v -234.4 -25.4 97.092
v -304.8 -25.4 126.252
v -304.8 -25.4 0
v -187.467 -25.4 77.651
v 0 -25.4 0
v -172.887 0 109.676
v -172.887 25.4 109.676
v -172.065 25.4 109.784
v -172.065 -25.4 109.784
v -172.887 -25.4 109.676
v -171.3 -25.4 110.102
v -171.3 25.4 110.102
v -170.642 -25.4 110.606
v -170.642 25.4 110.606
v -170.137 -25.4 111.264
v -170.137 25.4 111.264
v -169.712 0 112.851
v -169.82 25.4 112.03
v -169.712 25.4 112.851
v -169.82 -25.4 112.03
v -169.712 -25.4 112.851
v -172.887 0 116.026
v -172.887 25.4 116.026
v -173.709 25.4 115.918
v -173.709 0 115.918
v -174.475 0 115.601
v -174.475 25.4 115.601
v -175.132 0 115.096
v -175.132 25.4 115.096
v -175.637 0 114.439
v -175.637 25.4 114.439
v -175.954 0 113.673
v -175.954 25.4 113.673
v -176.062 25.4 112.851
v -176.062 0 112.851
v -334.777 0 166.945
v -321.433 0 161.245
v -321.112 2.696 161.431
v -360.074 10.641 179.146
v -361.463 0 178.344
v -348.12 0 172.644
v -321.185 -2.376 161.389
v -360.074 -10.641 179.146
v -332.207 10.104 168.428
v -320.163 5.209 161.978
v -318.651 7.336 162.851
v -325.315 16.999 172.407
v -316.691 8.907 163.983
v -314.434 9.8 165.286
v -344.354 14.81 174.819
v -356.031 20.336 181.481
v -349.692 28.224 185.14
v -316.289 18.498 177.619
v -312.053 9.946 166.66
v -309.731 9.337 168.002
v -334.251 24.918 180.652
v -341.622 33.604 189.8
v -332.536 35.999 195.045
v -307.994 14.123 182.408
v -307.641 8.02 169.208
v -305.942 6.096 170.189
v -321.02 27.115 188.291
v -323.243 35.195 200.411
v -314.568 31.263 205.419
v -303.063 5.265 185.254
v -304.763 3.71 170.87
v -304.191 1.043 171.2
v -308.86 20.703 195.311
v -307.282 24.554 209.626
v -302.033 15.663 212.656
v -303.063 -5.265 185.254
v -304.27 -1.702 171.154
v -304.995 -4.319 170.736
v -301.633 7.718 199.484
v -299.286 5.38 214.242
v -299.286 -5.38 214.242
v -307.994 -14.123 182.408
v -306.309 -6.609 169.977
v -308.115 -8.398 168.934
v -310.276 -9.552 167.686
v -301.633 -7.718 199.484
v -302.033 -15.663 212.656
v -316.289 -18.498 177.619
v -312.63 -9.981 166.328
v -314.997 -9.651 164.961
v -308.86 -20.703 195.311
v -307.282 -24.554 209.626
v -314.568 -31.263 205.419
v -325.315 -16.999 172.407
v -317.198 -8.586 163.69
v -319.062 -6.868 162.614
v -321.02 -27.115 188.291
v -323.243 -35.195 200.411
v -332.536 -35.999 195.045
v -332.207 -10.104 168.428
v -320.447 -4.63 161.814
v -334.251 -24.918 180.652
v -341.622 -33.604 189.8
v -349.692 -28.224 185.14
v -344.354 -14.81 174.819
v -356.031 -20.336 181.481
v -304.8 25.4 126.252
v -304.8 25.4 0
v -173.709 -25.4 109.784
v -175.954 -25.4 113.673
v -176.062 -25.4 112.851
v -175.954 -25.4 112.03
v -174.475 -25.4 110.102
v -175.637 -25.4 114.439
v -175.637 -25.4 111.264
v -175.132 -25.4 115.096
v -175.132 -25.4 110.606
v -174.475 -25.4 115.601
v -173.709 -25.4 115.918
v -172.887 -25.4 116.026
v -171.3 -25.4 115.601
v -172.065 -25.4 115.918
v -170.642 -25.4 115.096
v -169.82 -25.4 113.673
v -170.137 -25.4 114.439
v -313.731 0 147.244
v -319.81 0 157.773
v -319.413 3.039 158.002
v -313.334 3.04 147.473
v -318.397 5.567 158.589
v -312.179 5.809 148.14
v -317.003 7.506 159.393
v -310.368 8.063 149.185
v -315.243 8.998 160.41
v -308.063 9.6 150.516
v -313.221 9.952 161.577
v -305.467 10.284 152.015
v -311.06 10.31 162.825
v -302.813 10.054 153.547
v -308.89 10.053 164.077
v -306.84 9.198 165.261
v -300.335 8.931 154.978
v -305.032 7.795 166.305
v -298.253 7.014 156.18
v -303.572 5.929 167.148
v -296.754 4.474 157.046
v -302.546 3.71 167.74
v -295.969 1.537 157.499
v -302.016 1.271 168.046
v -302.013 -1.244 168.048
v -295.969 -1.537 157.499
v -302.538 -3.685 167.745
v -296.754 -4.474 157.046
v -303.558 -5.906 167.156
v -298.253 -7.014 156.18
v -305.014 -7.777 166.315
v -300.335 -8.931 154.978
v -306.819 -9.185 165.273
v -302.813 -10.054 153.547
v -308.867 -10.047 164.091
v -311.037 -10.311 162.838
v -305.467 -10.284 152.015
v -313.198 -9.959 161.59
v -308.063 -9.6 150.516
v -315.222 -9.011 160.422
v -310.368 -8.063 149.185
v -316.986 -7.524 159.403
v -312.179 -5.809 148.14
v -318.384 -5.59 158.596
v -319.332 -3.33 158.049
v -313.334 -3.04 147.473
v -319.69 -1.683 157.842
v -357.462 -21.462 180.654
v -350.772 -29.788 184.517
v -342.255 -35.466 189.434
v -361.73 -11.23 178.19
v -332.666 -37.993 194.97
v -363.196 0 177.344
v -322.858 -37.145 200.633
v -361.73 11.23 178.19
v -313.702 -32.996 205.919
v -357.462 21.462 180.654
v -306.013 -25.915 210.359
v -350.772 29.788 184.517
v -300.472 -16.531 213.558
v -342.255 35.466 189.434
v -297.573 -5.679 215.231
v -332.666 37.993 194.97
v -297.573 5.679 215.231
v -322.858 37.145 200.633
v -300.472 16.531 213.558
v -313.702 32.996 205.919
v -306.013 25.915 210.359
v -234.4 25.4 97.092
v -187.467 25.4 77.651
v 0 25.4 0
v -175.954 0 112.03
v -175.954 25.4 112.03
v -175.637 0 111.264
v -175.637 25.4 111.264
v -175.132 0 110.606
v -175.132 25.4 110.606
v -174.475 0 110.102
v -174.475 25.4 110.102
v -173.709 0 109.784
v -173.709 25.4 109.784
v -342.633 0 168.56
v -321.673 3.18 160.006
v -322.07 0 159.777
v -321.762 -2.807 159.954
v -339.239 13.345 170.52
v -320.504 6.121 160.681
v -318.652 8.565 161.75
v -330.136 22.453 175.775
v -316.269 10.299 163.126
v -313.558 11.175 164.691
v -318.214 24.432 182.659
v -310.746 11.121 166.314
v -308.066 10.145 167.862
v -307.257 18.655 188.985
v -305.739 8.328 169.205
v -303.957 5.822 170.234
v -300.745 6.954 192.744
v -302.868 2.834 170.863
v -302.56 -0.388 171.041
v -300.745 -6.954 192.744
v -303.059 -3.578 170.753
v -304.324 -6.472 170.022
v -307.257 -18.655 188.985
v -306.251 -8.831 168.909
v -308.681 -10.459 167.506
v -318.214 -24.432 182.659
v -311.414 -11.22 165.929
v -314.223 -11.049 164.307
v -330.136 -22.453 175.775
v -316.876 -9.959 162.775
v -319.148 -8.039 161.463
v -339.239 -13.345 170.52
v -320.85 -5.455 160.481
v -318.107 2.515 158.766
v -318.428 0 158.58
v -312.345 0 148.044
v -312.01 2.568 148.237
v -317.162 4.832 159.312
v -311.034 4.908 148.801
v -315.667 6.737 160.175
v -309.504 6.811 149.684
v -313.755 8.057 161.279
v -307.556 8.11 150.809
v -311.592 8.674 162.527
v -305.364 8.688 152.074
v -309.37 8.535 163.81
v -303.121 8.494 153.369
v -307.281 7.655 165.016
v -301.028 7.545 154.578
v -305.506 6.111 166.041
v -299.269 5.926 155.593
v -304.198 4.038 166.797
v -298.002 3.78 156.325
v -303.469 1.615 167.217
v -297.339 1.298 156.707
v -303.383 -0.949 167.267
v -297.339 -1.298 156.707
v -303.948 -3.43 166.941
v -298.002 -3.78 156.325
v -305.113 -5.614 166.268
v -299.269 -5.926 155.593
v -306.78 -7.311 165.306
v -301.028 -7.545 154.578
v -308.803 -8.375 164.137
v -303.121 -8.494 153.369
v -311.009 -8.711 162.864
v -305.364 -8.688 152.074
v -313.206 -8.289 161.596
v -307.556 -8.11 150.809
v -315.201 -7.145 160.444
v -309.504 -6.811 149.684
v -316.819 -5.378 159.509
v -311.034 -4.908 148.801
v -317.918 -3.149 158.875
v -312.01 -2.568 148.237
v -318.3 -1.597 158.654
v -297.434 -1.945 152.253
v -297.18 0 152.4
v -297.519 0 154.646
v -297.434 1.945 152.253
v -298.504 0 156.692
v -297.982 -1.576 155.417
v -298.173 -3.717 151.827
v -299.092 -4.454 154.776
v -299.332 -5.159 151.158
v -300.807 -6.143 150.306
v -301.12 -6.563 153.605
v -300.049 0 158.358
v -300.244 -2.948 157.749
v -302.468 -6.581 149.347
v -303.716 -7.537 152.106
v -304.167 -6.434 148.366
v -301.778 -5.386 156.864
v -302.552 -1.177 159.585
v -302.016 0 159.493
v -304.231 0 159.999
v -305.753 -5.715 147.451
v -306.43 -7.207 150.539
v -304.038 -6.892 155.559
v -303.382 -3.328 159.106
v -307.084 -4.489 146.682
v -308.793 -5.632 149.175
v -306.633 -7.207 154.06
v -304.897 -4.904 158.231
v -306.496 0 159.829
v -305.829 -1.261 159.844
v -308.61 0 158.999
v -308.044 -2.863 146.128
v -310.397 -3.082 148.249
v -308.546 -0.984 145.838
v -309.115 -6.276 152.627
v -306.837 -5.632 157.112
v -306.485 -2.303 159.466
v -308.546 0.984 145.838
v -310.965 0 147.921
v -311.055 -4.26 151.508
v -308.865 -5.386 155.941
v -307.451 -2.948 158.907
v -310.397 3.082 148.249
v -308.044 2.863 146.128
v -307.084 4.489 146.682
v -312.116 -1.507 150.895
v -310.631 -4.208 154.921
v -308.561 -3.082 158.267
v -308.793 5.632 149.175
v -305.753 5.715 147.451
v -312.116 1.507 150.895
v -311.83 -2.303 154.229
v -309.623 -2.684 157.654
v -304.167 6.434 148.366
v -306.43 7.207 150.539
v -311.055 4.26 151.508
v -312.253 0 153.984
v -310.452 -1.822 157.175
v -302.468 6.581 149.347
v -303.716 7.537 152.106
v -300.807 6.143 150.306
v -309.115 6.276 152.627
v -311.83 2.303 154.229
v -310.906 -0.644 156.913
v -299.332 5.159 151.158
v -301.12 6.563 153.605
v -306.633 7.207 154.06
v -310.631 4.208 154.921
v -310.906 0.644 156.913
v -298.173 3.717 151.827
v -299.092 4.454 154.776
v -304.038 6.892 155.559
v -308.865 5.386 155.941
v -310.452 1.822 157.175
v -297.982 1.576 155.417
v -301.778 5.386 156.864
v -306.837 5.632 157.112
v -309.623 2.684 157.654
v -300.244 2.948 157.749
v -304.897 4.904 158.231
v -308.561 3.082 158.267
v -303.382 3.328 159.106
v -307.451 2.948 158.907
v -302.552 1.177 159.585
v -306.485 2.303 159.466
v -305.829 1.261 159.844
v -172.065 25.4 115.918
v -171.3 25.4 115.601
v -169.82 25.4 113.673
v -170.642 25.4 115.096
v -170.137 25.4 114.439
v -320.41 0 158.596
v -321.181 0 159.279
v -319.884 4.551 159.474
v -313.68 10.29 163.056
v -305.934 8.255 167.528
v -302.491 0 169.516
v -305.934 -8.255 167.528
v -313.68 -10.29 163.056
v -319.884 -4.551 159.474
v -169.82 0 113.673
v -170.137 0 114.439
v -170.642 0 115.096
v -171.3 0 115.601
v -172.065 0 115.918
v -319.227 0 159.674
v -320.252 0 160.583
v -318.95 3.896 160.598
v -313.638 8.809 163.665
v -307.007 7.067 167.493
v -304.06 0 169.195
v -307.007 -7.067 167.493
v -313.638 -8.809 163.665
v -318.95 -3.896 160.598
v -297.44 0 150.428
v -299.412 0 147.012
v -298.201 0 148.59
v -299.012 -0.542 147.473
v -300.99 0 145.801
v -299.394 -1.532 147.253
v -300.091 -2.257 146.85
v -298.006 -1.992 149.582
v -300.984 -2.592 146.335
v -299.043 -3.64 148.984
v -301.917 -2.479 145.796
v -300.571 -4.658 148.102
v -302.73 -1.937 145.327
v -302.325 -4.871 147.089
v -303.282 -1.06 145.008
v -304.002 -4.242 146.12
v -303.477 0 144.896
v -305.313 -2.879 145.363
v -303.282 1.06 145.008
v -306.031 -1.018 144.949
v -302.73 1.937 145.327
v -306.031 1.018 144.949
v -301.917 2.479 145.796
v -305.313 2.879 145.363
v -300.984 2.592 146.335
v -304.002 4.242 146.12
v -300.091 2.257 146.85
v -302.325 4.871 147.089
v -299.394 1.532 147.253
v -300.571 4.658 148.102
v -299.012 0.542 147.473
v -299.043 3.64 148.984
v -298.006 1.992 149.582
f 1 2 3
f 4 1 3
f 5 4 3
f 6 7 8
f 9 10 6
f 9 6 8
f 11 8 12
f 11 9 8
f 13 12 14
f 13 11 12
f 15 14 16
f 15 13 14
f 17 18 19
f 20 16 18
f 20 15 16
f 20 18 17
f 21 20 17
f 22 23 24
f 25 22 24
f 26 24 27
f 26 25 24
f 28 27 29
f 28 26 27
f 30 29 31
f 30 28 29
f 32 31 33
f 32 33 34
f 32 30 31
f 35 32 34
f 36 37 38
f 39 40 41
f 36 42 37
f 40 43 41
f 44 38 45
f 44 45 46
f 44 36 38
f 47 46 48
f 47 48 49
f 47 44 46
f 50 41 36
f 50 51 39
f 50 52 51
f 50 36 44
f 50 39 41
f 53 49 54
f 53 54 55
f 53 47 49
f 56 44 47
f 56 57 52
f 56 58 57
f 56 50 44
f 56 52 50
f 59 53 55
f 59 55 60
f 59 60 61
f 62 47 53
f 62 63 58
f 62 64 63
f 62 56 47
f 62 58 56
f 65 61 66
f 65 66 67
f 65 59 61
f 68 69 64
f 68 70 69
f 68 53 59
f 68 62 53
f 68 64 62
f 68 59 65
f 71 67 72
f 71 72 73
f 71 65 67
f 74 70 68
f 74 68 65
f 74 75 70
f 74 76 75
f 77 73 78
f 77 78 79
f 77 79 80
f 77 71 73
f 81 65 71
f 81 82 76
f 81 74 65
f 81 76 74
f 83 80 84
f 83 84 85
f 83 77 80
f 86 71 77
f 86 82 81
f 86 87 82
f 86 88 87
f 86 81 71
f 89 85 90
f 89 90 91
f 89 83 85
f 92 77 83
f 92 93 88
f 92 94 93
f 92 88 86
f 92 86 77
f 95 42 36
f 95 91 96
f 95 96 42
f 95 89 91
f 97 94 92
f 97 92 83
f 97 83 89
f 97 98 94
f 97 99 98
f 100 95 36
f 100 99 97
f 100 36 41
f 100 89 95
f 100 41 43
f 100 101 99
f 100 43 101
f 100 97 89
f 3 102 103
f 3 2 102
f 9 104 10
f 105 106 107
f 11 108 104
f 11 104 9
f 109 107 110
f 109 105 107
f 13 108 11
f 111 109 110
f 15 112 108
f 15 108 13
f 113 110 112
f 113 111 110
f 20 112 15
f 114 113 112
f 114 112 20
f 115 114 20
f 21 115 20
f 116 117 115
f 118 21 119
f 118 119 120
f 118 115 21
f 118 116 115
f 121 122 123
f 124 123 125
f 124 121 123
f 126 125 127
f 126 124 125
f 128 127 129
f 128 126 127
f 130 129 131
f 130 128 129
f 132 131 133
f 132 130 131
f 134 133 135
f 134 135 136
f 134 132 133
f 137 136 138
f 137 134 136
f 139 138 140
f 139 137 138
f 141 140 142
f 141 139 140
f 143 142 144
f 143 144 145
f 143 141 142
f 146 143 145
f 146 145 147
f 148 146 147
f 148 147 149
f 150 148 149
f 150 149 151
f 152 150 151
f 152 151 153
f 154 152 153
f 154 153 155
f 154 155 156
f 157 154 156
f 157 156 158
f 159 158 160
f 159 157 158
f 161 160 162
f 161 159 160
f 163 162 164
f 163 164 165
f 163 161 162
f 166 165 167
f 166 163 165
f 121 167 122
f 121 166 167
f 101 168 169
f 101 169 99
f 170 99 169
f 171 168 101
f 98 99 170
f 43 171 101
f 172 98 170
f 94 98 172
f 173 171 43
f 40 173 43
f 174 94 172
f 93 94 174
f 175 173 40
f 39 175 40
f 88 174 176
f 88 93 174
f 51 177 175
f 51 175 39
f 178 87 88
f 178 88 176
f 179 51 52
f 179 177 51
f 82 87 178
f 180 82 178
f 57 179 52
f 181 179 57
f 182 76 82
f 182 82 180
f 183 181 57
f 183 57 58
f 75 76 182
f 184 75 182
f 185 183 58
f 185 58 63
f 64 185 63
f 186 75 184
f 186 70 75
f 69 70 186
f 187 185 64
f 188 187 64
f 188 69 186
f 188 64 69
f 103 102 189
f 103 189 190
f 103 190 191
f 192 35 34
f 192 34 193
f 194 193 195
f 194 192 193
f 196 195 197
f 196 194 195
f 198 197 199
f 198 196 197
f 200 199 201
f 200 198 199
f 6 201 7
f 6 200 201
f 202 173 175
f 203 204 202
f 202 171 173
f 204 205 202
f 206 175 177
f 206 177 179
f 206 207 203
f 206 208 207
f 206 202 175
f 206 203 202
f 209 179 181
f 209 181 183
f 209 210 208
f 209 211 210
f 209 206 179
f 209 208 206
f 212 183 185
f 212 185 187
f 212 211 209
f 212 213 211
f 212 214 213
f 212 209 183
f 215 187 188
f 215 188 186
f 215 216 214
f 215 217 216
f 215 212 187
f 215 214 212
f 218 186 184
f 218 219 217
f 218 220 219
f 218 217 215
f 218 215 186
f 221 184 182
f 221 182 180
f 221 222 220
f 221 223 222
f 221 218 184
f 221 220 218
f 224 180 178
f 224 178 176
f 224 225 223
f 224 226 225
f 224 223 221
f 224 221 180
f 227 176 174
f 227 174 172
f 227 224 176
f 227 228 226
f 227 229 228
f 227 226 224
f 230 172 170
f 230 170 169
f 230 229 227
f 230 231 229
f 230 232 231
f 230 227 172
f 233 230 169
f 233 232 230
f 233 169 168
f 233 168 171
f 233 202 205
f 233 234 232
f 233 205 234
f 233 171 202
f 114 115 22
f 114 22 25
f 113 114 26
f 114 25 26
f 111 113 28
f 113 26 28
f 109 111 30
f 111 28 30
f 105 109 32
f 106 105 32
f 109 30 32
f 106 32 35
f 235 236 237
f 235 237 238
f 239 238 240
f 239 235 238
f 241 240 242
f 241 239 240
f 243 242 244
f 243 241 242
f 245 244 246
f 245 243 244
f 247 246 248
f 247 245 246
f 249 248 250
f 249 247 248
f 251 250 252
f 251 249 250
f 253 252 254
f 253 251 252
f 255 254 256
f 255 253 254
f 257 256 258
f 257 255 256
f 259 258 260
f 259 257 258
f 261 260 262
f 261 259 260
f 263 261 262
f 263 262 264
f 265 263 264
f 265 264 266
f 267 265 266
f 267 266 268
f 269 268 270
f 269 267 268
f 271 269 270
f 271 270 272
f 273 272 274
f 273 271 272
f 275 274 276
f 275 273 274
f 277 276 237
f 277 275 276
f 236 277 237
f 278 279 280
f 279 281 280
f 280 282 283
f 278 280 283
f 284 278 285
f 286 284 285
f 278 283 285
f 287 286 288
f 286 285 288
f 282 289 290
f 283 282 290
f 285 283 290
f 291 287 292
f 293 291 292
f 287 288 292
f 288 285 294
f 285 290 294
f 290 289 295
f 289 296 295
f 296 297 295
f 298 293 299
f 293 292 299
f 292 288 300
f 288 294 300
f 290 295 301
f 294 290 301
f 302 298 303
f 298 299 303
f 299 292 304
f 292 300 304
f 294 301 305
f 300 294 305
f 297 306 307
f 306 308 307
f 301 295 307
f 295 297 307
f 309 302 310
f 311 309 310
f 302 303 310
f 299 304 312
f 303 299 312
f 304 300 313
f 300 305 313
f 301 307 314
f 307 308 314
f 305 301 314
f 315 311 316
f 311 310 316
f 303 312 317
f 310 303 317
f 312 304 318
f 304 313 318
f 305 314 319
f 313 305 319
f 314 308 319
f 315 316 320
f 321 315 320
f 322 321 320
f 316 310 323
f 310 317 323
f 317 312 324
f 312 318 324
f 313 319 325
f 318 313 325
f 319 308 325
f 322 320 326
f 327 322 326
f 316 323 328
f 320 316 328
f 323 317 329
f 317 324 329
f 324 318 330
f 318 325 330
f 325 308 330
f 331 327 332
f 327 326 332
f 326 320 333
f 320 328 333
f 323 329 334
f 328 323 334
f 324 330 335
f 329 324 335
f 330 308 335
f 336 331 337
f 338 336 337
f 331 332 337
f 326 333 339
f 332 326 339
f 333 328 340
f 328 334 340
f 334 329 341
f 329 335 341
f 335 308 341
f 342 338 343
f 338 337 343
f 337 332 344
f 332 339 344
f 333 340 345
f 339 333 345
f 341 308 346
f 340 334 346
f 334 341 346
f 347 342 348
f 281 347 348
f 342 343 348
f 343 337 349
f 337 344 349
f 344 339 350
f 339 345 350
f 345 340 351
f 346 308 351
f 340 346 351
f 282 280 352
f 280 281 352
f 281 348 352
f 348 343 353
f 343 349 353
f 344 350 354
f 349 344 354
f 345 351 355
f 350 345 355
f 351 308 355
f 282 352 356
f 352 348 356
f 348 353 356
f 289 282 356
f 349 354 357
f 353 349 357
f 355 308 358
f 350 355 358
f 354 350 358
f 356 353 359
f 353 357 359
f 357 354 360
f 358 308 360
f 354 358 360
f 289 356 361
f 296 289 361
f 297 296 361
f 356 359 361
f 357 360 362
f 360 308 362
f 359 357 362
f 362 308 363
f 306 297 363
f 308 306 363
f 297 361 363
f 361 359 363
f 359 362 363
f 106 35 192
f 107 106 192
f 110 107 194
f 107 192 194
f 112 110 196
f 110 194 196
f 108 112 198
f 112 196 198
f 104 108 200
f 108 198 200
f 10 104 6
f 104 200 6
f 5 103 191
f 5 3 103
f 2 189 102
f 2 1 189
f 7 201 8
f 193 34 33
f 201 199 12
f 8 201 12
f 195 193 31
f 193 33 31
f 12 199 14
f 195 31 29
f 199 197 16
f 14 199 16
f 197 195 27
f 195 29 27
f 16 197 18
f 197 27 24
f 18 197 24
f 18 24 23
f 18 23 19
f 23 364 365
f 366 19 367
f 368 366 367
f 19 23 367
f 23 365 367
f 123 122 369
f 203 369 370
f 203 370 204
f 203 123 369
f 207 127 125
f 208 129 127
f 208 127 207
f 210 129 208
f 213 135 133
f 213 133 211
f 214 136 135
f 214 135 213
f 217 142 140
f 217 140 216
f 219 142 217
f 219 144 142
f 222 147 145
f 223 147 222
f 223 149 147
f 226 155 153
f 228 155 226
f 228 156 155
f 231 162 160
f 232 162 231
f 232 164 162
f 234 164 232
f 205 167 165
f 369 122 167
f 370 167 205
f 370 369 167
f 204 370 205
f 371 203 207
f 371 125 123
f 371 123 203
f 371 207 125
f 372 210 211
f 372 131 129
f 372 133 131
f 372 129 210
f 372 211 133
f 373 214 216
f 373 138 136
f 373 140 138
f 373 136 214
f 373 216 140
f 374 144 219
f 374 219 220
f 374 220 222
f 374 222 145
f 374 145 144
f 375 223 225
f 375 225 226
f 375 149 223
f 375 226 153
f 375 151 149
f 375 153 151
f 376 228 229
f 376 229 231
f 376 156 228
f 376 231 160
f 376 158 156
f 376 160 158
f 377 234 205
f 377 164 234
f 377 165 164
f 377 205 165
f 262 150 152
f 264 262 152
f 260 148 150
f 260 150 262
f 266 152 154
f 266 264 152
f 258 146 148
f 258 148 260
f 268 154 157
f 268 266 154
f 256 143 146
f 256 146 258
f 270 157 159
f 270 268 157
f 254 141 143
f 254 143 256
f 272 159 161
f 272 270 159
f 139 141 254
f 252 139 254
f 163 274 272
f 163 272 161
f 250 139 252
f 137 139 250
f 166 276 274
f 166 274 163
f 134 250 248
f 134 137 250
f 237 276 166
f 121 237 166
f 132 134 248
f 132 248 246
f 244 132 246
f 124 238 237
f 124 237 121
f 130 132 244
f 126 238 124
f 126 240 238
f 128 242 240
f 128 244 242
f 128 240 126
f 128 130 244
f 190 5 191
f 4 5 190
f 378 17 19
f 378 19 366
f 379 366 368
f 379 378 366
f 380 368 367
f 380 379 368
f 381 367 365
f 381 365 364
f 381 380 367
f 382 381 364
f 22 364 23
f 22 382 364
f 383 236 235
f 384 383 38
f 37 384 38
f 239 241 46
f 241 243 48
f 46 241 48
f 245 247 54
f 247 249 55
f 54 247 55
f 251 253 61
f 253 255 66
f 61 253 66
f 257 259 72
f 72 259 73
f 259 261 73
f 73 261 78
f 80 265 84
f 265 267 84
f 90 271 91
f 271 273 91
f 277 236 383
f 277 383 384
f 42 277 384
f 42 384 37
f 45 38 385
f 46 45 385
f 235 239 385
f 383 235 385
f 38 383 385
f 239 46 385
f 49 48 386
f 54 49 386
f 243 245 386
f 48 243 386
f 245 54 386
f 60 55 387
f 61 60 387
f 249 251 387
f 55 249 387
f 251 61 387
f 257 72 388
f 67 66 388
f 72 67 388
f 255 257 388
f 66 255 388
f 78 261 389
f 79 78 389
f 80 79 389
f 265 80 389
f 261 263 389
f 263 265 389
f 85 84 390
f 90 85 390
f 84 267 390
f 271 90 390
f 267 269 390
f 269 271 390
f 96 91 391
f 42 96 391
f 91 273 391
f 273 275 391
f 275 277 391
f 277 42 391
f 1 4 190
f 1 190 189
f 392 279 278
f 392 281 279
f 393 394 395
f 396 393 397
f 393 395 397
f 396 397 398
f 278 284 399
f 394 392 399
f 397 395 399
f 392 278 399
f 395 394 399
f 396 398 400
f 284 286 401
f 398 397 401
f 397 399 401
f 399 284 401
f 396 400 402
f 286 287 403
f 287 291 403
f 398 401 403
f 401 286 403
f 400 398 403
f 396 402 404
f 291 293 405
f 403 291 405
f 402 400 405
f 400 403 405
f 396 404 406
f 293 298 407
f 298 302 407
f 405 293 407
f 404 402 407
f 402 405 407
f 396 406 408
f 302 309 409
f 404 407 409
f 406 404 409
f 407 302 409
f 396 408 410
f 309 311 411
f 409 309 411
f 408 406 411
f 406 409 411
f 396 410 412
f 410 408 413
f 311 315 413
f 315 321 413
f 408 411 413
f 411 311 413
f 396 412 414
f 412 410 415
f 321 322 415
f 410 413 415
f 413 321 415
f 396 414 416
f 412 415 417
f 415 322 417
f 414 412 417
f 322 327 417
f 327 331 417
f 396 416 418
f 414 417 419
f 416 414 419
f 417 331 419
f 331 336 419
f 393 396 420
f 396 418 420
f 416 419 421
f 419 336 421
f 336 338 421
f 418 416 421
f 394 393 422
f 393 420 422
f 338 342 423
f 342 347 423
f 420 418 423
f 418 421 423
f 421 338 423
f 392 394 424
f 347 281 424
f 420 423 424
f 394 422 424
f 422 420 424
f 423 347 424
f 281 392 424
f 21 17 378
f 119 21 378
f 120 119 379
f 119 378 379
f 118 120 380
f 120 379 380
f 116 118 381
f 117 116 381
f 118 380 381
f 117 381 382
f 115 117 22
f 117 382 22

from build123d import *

# Parameters (mm, degrees)
F3_R     = 6.35
F4_R     = 4.7752
F5_DEPTH = 25.4


with BuildPart() as f1:
    # F0 (on Front) → F1 (revolve)
    with BuildSketch(Plane.XZ):
        Polygon((-361.4633005703, 178.3442155122), (-363.1955678842, 177.3440905122), (-320.6057337073, 159.151533832), (-313.730800374, 147.2438), (-312.3449865229, 148.0439), (-319.4866198562, 160.4135717824), align=None)
    revolve(axis=Axis((-317.5, 0, 174.3970452561), (0.5, 0, -0.8660254038)))

    # F3
    f3_edges = [f1.edges().sort_by_distance(p)[0] for p in [
        (-304.396647, 0, 169.125772),
    ]]
    fillet(f3_edges, radius=F3_R)

    # F4
    f4_edges = [f1.edges().sort_by_distance(p)[0] for p in [
        (-302.744133, 0, 169.463934),
    ]]
    fillet(f4_edges, radius=F4_R)


with BuildPart() as f2:
    # F0 (on Front) → F2 (revolve)
    with BuildSketch(Plane.XZ):
        with BuildLine():
            Line((-308.61, 158.9991135768), (-304.8, 152.4))
            Line((-304.8, 152.4), (-300.99, 145.8008864232))
            ThreePointArc((-300.99, 145.8008864232), (-298.2008864232, 148.59), (-297.18, 152.4))
            ThreePointArc((-297.18, 152.4), (-300.99, 158.9991135768), (-308.61, 158.9991135768))
        make_face()
    revolve(axis=Axis((-304.8, 0, 152.4), (0.5, 0, -0.8660254038)))


with BuildPart() as f5:
    # F0 (on Front) → F5 (new body, symmetric)
    with BuildSketch(Plane.XZ):
        with BuildLine():
            ThreePointArc((-172.887060598, 109.6763080896), (-170.6419965677, 110.6062440594), (-169.712060598, 112.8513080896))
            ThreePointArc((-169.712060598, 112.8513080896), (-170.6419965677, 115.0963721199), (-172.887060598, 116.0263080896))
            ThreePointArc((-172.887060598, 116.0263080896), (-175.1321246282, 115.0963721199), (-176.062060598, 112.8513080896))
            ThreePointArc((-176.062060598, 112.8513080896), (-175.1321246282, 110.6062440594), (-172.887060598, 109.6763080896))
        make_face()
    extrude(amount=F5_DEPTH, both=True)


with BuildPart() as f5b:
    # F0 (on Front) → F5, piece 2 (new body, symmetric)
    with BuildSketch(Plane.XZ):
        Polygon((-304.8, 0), (0, 0), (-187.4672991352, 77.6514978032), (-234.4003803353, 97.0918165603), (-304.8, 126.2522938113), align=None)
    extrude(amount=F5_DEPTH, both=True)


solid = Compound([f1.part, f2.part, f5.part, f5b.part])
